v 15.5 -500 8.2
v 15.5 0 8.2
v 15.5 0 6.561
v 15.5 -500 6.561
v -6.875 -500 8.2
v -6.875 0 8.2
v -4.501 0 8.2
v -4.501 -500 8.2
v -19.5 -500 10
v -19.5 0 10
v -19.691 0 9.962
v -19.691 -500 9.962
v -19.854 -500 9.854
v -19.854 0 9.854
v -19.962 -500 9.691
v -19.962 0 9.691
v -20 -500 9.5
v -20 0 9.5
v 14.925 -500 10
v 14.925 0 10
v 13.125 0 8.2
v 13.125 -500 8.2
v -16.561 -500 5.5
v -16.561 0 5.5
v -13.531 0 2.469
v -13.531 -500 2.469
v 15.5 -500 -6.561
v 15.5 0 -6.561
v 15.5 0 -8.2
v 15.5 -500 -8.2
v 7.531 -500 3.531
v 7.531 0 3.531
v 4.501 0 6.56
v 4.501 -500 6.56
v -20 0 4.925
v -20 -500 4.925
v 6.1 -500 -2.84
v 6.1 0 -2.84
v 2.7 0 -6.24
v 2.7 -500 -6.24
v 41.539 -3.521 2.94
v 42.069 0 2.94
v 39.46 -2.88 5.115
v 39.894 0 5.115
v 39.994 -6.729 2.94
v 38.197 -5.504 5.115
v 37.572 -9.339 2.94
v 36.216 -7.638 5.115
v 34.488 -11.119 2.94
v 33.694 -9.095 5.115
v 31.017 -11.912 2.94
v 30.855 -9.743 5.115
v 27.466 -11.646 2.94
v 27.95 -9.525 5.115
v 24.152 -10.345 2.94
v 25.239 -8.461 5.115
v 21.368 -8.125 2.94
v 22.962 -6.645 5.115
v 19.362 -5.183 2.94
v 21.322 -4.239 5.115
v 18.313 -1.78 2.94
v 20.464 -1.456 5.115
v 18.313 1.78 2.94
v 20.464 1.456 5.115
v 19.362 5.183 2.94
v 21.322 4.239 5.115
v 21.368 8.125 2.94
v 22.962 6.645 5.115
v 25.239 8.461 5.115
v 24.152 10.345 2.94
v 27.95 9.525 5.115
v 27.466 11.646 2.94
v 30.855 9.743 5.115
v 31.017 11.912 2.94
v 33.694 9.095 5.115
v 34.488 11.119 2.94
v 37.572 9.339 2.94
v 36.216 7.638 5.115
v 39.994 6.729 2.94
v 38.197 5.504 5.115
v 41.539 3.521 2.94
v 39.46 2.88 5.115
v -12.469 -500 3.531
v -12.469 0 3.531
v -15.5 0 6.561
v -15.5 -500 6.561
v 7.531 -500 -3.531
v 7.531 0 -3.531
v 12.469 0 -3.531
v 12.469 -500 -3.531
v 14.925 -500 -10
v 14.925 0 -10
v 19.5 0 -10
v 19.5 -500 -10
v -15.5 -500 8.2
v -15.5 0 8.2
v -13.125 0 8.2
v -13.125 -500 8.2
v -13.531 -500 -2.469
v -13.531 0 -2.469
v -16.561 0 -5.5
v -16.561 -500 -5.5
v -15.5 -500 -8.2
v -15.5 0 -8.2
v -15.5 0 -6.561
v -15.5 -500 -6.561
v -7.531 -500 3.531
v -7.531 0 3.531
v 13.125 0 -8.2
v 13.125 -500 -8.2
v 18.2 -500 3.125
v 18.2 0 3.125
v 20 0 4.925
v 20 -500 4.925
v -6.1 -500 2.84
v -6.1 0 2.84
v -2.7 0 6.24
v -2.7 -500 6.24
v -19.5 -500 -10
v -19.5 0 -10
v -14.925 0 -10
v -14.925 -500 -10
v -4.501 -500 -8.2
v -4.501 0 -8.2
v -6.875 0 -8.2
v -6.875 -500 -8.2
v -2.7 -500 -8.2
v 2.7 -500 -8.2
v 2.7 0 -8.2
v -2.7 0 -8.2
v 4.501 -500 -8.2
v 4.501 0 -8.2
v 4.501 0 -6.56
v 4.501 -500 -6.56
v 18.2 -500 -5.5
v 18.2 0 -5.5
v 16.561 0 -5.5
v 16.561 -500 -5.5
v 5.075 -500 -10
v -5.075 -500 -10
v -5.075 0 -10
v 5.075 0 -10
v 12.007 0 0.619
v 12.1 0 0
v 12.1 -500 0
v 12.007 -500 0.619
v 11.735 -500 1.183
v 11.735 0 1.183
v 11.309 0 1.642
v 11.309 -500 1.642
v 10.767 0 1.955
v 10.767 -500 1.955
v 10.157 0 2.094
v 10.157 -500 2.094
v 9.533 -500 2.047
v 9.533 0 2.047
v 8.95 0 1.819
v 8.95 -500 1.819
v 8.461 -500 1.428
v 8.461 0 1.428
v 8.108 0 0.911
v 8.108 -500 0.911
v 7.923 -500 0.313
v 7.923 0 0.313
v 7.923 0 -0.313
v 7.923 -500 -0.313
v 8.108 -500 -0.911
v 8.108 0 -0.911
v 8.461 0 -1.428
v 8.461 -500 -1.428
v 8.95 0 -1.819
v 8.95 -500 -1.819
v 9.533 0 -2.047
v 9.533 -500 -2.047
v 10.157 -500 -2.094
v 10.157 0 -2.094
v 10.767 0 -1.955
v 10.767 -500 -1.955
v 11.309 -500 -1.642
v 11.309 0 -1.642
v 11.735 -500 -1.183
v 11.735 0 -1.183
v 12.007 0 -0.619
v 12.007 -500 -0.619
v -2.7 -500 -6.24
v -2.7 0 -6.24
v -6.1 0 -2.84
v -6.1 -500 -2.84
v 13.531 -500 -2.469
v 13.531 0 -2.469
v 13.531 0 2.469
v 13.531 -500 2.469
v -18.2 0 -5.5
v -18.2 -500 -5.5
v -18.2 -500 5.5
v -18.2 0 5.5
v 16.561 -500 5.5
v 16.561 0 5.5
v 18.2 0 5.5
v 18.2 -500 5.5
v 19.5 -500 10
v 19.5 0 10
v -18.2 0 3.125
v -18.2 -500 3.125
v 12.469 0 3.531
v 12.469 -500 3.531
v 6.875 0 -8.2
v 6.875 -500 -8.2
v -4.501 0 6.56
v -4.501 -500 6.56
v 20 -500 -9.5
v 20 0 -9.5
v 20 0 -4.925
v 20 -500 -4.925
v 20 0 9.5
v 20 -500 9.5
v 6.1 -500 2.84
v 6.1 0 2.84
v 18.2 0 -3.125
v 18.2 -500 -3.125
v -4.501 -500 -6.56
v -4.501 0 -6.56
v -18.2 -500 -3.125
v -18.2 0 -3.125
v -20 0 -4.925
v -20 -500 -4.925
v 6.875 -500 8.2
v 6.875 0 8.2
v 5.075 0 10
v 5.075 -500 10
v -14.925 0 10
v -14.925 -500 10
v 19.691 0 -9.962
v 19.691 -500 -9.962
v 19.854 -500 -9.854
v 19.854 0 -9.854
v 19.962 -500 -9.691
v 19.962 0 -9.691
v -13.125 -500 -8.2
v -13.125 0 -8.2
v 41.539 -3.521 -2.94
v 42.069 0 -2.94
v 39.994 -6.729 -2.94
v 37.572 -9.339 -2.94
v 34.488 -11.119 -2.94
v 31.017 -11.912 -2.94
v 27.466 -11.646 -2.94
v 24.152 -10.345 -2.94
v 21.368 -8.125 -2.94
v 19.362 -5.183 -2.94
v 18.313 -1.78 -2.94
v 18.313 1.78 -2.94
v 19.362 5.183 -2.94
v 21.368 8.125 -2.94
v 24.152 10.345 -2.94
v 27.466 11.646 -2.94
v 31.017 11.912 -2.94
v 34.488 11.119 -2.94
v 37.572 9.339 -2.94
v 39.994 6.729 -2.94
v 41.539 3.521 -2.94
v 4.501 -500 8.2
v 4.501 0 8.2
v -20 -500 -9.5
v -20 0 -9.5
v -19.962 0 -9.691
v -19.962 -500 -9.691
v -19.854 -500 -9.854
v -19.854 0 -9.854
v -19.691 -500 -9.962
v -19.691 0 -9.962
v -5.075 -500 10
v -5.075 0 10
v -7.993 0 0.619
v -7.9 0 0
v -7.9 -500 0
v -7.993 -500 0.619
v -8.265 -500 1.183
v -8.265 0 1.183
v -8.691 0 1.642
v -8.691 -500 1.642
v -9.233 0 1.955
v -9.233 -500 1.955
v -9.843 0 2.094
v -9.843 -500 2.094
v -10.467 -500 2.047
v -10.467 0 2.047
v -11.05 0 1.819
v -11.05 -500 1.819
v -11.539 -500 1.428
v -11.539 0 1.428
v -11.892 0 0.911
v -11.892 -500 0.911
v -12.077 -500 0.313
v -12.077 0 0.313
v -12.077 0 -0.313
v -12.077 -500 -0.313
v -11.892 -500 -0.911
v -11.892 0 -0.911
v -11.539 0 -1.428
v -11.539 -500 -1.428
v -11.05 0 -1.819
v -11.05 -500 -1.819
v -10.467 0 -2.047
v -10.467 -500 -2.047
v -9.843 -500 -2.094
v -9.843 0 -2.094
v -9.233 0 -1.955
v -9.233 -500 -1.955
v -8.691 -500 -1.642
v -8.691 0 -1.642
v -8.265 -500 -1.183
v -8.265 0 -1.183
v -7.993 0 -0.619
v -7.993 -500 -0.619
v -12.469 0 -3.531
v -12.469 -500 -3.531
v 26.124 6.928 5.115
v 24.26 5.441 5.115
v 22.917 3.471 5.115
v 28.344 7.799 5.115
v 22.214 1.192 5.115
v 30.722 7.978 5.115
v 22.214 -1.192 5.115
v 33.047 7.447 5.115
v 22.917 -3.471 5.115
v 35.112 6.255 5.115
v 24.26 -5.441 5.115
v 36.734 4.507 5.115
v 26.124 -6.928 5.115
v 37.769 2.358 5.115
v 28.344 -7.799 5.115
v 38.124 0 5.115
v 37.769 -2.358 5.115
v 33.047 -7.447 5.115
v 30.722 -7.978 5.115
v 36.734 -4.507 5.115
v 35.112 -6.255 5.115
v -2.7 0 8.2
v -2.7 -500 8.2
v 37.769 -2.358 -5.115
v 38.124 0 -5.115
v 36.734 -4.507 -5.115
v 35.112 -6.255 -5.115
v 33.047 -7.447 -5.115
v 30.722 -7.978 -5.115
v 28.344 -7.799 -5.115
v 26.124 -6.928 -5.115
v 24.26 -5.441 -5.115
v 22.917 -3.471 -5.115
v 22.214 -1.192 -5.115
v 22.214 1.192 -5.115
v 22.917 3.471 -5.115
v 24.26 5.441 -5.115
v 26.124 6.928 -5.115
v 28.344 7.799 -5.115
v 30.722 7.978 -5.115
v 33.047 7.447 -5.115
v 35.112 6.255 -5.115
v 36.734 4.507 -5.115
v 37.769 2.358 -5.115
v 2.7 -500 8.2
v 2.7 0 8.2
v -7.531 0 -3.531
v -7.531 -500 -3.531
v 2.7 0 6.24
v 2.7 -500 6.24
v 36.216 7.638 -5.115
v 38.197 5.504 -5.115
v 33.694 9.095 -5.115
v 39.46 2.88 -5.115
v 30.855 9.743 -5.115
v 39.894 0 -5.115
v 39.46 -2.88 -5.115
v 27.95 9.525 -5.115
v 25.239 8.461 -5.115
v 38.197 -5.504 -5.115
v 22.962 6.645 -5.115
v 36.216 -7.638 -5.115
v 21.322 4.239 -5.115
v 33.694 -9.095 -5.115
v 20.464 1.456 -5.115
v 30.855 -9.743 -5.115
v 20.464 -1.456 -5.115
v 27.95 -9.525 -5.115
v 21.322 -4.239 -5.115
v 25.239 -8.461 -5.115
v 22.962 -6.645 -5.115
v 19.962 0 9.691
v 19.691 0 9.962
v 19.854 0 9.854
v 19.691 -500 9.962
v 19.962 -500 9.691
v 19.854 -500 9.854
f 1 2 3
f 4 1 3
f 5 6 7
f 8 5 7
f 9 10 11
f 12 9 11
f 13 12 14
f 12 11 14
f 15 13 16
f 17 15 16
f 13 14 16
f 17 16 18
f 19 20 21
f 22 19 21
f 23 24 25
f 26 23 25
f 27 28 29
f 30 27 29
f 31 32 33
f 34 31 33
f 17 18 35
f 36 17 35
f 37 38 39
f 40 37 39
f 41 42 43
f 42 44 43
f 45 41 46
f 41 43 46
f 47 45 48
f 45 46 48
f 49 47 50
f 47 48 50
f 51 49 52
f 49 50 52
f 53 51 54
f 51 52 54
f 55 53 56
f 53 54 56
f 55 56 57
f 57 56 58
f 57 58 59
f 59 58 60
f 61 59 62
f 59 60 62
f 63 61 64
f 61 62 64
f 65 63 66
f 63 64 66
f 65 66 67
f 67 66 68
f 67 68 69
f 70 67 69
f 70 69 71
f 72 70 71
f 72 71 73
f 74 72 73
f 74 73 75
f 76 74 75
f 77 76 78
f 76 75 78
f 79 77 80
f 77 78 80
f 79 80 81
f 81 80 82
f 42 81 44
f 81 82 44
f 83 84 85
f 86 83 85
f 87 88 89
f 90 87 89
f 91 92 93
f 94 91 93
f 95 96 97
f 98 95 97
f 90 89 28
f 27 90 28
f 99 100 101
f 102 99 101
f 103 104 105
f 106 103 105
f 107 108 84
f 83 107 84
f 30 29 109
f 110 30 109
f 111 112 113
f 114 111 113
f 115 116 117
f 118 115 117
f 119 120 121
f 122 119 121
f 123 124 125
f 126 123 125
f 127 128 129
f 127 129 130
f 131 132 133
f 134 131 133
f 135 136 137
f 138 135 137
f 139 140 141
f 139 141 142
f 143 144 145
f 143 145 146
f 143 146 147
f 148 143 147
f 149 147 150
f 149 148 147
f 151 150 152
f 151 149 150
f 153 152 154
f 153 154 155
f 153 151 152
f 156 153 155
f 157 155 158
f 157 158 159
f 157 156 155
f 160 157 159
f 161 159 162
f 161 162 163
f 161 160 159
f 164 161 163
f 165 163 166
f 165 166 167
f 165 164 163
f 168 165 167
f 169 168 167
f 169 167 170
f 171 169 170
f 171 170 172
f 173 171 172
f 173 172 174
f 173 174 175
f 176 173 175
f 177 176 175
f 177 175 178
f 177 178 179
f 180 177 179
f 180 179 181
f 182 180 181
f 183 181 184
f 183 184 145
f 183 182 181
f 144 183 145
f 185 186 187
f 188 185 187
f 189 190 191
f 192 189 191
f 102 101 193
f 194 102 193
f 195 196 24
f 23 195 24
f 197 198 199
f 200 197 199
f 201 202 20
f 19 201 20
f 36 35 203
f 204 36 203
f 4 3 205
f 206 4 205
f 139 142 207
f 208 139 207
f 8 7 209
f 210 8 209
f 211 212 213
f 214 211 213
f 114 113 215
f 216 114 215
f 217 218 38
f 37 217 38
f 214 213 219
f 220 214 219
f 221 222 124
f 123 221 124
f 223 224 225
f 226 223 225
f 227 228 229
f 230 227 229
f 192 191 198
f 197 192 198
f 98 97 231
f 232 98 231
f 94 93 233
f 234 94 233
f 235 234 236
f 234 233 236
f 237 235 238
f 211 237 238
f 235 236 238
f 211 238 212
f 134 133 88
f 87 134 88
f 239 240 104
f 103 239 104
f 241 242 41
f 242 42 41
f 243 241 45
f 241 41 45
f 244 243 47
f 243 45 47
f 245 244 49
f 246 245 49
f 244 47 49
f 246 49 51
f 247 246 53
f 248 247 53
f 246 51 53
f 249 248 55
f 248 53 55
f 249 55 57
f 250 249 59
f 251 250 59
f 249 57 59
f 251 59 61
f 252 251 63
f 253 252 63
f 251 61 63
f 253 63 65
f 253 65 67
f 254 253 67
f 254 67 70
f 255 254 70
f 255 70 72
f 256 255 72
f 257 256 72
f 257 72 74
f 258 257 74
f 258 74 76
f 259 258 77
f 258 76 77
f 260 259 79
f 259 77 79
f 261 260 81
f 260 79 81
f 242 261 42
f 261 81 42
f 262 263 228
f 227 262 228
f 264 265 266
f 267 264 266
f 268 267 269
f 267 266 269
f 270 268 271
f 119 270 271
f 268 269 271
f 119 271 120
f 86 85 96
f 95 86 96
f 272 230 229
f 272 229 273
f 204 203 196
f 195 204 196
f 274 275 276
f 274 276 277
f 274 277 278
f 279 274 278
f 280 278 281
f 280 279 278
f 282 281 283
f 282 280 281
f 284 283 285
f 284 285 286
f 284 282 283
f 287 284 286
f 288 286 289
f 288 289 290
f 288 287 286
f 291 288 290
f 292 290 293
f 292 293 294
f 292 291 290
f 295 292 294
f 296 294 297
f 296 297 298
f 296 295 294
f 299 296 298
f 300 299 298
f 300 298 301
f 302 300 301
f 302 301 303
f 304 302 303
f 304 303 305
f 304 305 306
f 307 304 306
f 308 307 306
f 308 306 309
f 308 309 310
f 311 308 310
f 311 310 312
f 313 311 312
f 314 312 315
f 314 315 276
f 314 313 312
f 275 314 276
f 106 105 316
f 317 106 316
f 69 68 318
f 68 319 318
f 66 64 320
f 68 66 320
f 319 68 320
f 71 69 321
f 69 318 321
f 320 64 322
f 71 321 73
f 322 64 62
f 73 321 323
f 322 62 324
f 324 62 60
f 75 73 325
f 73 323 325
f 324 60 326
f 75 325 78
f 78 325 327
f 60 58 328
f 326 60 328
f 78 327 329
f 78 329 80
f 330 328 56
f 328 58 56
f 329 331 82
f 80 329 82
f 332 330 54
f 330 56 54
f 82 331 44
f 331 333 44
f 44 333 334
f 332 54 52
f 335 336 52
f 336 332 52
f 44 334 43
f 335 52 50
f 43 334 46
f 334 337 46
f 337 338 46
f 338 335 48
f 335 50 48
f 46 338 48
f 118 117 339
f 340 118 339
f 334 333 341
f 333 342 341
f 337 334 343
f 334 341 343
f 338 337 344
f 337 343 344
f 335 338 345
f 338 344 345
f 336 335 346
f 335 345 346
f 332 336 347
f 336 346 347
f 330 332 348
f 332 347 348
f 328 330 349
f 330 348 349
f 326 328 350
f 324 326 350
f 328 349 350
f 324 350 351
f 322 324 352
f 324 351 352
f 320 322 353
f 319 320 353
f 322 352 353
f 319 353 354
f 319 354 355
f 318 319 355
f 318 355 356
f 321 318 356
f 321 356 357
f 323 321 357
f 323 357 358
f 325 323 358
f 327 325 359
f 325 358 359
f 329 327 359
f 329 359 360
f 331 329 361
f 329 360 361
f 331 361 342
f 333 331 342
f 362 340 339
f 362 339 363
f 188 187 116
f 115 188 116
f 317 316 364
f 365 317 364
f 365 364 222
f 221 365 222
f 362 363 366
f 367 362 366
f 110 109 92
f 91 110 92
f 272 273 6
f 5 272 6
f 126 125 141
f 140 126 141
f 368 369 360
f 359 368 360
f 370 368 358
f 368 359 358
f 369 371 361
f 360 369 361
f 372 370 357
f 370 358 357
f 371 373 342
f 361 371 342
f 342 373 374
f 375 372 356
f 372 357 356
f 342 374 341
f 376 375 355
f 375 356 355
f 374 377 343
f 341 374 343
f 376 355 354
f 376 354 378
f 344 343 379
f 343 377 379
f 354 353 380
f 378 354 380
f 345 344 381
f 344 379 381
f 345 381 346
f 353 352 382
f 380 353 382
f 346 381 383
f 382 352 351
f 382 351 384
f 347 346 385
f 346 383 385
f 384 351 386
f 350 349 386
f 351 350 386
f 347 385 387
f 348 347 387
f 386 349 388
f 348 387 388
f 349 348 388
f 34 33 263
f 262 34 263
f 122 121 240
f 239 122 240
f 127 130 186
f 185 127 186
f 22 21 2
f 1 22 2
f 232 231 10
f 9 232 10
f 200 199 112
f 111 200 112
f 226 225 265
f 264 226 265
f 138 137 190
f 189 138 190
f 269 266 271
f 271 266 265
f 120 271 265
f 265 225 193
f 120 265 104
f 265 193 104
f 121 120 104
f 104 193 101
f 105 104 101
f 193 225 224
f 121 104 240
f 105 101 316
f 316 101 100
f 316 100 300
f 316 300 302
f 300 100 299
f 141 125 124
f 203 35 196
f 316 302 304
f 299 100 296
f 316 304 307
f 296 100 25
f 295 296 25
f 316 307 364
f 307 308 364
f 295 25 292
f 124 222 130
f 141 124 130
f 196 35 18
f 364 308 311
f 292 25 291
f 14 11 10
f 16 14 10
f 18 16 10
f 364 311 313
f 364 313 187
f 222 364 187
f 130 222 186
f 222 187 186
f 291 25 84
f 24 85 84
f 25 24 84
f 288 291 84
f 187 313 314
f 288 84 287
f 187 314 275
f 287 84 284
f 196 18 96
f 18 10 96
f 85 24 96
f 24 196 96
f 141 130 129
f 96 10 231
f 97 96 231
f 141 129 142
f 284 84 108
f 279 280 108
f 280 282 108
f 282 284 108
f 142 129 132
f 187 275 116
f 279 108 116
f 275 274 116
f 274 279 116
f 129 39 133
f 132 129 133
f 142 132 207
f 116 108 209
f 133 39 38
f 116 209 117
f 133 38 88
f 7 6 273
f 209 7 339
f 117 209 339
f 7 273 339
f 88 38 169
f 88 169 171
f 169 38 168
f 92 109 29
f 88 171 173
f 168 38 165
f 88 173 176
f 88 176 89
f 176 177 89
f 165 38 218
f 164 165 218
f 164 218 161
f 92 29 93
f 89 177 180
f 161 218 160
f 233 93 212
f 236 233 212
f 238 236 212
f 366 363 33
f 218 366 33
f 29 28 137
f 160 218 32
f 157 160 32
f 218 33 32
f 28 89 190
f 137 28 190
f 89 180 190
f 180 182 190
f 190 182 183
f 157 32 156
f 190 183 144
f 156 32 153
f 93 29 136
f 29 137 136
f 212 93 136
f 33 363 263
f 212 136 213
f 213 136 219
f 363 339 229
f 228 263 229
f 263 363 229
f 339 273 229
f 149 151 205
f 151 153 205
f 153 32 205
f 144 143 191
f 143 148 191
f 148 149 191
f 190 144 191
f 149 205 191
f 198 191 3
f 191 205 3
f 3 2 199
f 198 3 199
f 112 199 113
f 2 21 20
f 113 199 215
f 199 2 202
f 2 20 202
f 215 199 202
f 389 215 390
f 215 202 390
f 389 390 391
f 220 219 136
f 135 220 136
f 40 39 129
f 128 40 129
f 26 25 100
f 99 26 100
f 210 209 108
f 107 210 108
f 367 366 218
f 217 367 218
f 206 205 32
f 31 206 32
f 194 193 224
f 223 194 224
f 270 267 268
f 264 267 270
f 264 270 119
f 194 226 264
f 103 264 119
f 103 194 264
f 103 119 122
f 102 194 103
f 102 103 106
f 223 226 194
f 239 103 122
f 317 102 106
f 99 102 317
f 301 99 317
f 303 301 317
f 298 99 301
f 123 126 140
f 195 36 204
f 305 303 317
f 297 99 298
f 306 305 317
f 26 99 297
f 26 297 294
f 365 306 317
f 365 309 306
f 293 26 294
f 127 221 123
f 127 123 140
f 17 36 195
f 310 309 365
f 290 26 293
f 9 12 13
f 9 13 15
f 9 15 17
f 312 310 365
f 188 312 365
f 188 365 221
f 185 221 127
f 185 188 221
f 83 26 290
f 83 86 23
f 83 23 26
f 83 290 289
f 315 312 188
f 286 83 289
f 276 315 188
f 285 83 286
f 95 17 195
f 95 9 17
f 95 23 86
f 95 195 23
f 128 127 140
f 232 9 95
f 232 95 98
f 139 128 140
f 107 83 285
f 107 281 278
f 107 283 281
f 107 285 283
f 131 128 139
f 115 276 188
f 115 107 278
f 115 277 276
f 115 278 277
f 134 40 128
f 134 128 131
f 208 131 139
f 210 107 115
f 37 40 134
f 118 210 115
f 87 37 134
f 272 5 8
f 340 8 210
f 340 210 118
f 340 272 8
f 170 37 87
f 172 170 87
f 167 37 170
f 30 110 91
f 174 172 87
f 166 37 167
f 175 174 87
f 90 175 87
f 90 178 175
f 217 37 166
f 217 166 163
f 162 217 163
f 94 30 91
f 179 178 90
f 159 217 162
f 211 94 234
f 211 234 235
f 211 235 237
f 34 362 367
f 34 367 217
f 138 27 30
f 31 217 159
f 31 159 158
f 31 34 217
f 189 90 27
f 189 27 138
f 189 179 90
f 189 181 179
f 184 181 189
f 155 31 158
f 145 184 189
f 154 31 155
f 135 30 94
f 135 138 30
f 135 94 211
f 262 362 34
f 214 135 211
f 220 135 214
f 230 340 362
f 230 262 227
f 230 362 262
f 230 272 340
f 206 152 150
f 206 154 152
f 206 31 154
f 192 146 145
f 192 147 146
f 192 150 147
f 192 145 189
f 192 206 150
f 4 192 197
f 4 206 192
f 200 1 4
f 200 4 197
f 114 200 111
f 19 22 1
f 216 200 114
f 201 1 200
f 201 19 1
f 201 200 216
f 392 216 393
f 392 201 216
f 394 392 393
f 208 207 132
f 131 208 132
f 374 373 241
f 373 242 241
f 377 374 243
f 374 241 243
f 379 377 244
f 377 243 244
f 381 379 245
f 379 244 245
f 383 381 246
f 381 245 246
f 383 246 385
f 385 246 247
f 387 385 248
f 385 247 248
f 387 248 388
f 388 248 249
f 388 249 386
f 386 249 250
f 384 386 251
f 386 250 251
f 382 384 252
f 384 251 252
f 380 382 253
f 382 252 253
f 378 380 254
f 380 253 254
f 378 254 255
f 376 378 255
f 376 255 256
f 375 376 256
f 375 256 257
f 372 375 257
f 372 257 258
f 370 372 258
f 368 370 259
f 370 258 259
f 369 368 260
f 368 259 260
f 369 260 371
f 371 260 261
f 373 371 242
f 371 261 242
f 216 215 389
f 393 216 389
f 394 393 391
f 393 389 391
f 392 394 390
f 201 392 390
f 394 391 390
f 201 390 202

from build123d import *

# Parameters (mm, degrees)
F0_R     = 2.1
F1_DEPTH = 500


with BuildPart() as f1:
    # F0 (on Front) → F1 (new body)
    with BuildSketch(Plane.XZ):
        with BuildLine():
            Line((2.7, -6.24), (2.7, -8.2))
            Line((2.7, -8.2), (0, -8.2))
            Line((0, -8.2), (0, -10))
            Line((0, -10), (5.075, -10))
            Line((5.075, -10), (6.875, -8.2))
            Line((6.875, -8.2), (4.50132, -8.2))
            Line((4.50132, -8.2), (4.50132, -6.56))
            Line((4.50132, -6.56), (7.530778, -3.530543))
            Line((7.530778, -3.530543), (10, -3.530543))
            Line((10, -3.530543), (12.469222, -3.530543))
            Line((12.469222, -3.530543), (15.5, -6.56132))
            Line((15.5, -6.56132), (15.5, -8.2))
            Line((15.5, -8.2), (13.125, -8.2))
            Line((13.125, -8.2), (14.925, -10))
            Line((14.925, -10), (19.5, -10))
            ThreePointArc((19.5, -10), (19.853553, -9.853553), (20, -9.5))
            Line((20, -9.5), (20, -4.925))
            Line((20, -4.925), (18.2, -3.125))
            Line((18.2, -3.125), (18.2, -5.5))
            Line((18.2, -5.5), (16.56132, -5.5))
            Line((16.56132, -5.5), (13.530543, -2.469222))
            Line((13.530543, -2.469222), (13.530543, 0))
            Line((13.530543, 0), (13.530543, 2.469222))
            Line((13.530543, 2.469222), (16.56132, 5.5))
            Line((16.56132, 5.5), (18.2, 5.5))
            Line((18.2, 5.5), (18.2, 3.125))
            Line((18.2, 3.125), (20, 4.925))
            Line((20, 4.925), (20, 9.5))
            ThreePointArc((20, 9.5), (19.853553, 9.853553), (19.5, 10))
            Line((19.5, 10), (14.925, 10))
            Line((14.925, 10), (13.125, 8.2))
            Line((13.125, 8.2), (15.5, 8.2))
            Line((15.5, 8.2), (15.5, 6.56132))
            Line((15.5, 6.56132), (12.469222, 3.530543))
            Line((12.469222, 3.530543), (10, 3.530543))
            Line((10, 3.530543), (7.530778, 3.530543))
            Line((7.530778, 3.530543), (4.50132, 6.56))
            Line((4.50132, 6.56), (4.50132, 8.2))
            Line((4.50132, 8.2), (6.875, 8.2))
            Line((6.875, 8.2), (5.075, 10))
            Line((5.075, 10), (0, 10))
            Line((0, 10), (0, 8.2))
            Line((0, 8.2), (2.7, 8.2))
            Line((2.7, 8.2), (2.7, 6.24))
            Line((2.7, 6.24), (6.1, 2.84))
            Line((6.1, 2.84), (6.1, -2.84))
            Line((6.1, -2.84), (2.7, -6.24))
        make_face()
        with Locations((10, 0)):
            Circle(F0_R, mode=Mode.SUBTRACT)
        with BuildLine():
            Line((0, -10), (0, -8.2))
            Line((0, -8.2), (-2.7, -8.2))
            Line((-2.7, -8.2), (-2.7, -6.24))
            Line((-2.7, -6.24), (-6.1, -2.84))
            Line((-6.1, -2.84), (-6.1, 2.84))
            Line((-6.1, 2.84), (-2.7, 6.24))
            Line((-2.7, 6.24), (-2.7, 8.2))
            Line((-2.7, 8.2), (0, 8.2))
            Line((0, 8.2), (0, 10))
            Line((0, 10), (-5.075, 10))
            Line((-5.075, 10), (-6.875, 8.2))
            Line((-6.875, 8.2), (-4.50132, 8.2))
            Line((-4.50132, 8.2), (-4.50132, 6.56))
            Line((-4.50132, 6.56), (-7.530778, 3.530543))
            Line((-7.530778, 3.530543), (-10, 3.530543))
            Line((-10, 3.530543), (-12.469222, 3.530543))
            Line((-12.469222, 3.530543), (-15.5, 6.56132))
            Line((-15.5, 6.56132), (-15.5, 8.2))
            Line((-15.5, 8.2), (-13.125, 8.2))
            Line((-13.125, 8.2), (-14.925, 10))
            Line((-14.925, 10), (-19.5, 10))
            ThreePointArc((-19.5, 10), (-19.853553, 9.853553), (-20, 9.5))
            Line((-20, 9.5), (-20, 4.925))
            Line((-20, 4.925), (-18.2, 3.125))
            Line((-18.2, 3.125), (-18.2, 5.5))
            Line((-18.2, 5.5), (-16.56132, 5.5))
            Line((-16.56132, 5.5), (-13.530543, 2.469222))
            Line((-13.530543, 2.469222), (-13.530543, 0))
            Line((-13.530543, 0), (-13.530543, -2.469222))
            Line((-13.530543, -2.469222), (-16.56132, -5.5))
            Line((-16.56132, -5.5), (-18.2, -5.5))
            Line((-18.2, -5.5), (-18.2, -3.125))
            Line((-18.2, -3.125), (-20, -4.925))
            Line((-20, -4.925), (-20, -9.5))
            ThreePointArc((-20, -9.5), (-19.853553, -9.853553), (-19.5, -10))
            Line((-19.5, -10), (-14.925, -10))
            Line((-14.925, -10), (-13.125, -8.2))
            Line((-13.125, -8.2), (-15.5, -8.2))
            Line((-15.5, -8.2), (-15.5, -6.56132))
            Line((-15.5, -6.56132), (-12.469222, -3.530543))
            Line((-12.469222, -3.530543), (-10, -3.530543))
            Line((-10, -3.530543), (-7.530778, -3.530543))
            Line((-7.530778, -3.530543), (-4.50132, -6.56))
            Line((-4.50132, -6.56), (-4.50132, -8.2))
            Line((-4.50132, -8.2), (-6.875, -8.2))
            Line((-6.875, -8.2), (-5.075, -10))
            Line((-5.075, -10), (0, -10))
        make_face()
        with Locations((-10, 0)):
            Circle(F0_R, mode=Mode.SUBTRACT)
    extrude(amount=F1_DEPTH)


with BuildPart() as f3:
    # F2 (on Front) → F3 (revolve)
    with BuildSketch(Plane.XZ):
        Polygon((42.069407, 2.94), (39.894407, 5.115), (38.124407, 5.115), (38.124407, -5.115), (39.894407, -5.115), (42.069407, -2.94), align=None)
    revolve(axis=Axis((30.124407, 0, 0), (0, 0, -1)))


solid = Compound([f1.part, f3.part])
